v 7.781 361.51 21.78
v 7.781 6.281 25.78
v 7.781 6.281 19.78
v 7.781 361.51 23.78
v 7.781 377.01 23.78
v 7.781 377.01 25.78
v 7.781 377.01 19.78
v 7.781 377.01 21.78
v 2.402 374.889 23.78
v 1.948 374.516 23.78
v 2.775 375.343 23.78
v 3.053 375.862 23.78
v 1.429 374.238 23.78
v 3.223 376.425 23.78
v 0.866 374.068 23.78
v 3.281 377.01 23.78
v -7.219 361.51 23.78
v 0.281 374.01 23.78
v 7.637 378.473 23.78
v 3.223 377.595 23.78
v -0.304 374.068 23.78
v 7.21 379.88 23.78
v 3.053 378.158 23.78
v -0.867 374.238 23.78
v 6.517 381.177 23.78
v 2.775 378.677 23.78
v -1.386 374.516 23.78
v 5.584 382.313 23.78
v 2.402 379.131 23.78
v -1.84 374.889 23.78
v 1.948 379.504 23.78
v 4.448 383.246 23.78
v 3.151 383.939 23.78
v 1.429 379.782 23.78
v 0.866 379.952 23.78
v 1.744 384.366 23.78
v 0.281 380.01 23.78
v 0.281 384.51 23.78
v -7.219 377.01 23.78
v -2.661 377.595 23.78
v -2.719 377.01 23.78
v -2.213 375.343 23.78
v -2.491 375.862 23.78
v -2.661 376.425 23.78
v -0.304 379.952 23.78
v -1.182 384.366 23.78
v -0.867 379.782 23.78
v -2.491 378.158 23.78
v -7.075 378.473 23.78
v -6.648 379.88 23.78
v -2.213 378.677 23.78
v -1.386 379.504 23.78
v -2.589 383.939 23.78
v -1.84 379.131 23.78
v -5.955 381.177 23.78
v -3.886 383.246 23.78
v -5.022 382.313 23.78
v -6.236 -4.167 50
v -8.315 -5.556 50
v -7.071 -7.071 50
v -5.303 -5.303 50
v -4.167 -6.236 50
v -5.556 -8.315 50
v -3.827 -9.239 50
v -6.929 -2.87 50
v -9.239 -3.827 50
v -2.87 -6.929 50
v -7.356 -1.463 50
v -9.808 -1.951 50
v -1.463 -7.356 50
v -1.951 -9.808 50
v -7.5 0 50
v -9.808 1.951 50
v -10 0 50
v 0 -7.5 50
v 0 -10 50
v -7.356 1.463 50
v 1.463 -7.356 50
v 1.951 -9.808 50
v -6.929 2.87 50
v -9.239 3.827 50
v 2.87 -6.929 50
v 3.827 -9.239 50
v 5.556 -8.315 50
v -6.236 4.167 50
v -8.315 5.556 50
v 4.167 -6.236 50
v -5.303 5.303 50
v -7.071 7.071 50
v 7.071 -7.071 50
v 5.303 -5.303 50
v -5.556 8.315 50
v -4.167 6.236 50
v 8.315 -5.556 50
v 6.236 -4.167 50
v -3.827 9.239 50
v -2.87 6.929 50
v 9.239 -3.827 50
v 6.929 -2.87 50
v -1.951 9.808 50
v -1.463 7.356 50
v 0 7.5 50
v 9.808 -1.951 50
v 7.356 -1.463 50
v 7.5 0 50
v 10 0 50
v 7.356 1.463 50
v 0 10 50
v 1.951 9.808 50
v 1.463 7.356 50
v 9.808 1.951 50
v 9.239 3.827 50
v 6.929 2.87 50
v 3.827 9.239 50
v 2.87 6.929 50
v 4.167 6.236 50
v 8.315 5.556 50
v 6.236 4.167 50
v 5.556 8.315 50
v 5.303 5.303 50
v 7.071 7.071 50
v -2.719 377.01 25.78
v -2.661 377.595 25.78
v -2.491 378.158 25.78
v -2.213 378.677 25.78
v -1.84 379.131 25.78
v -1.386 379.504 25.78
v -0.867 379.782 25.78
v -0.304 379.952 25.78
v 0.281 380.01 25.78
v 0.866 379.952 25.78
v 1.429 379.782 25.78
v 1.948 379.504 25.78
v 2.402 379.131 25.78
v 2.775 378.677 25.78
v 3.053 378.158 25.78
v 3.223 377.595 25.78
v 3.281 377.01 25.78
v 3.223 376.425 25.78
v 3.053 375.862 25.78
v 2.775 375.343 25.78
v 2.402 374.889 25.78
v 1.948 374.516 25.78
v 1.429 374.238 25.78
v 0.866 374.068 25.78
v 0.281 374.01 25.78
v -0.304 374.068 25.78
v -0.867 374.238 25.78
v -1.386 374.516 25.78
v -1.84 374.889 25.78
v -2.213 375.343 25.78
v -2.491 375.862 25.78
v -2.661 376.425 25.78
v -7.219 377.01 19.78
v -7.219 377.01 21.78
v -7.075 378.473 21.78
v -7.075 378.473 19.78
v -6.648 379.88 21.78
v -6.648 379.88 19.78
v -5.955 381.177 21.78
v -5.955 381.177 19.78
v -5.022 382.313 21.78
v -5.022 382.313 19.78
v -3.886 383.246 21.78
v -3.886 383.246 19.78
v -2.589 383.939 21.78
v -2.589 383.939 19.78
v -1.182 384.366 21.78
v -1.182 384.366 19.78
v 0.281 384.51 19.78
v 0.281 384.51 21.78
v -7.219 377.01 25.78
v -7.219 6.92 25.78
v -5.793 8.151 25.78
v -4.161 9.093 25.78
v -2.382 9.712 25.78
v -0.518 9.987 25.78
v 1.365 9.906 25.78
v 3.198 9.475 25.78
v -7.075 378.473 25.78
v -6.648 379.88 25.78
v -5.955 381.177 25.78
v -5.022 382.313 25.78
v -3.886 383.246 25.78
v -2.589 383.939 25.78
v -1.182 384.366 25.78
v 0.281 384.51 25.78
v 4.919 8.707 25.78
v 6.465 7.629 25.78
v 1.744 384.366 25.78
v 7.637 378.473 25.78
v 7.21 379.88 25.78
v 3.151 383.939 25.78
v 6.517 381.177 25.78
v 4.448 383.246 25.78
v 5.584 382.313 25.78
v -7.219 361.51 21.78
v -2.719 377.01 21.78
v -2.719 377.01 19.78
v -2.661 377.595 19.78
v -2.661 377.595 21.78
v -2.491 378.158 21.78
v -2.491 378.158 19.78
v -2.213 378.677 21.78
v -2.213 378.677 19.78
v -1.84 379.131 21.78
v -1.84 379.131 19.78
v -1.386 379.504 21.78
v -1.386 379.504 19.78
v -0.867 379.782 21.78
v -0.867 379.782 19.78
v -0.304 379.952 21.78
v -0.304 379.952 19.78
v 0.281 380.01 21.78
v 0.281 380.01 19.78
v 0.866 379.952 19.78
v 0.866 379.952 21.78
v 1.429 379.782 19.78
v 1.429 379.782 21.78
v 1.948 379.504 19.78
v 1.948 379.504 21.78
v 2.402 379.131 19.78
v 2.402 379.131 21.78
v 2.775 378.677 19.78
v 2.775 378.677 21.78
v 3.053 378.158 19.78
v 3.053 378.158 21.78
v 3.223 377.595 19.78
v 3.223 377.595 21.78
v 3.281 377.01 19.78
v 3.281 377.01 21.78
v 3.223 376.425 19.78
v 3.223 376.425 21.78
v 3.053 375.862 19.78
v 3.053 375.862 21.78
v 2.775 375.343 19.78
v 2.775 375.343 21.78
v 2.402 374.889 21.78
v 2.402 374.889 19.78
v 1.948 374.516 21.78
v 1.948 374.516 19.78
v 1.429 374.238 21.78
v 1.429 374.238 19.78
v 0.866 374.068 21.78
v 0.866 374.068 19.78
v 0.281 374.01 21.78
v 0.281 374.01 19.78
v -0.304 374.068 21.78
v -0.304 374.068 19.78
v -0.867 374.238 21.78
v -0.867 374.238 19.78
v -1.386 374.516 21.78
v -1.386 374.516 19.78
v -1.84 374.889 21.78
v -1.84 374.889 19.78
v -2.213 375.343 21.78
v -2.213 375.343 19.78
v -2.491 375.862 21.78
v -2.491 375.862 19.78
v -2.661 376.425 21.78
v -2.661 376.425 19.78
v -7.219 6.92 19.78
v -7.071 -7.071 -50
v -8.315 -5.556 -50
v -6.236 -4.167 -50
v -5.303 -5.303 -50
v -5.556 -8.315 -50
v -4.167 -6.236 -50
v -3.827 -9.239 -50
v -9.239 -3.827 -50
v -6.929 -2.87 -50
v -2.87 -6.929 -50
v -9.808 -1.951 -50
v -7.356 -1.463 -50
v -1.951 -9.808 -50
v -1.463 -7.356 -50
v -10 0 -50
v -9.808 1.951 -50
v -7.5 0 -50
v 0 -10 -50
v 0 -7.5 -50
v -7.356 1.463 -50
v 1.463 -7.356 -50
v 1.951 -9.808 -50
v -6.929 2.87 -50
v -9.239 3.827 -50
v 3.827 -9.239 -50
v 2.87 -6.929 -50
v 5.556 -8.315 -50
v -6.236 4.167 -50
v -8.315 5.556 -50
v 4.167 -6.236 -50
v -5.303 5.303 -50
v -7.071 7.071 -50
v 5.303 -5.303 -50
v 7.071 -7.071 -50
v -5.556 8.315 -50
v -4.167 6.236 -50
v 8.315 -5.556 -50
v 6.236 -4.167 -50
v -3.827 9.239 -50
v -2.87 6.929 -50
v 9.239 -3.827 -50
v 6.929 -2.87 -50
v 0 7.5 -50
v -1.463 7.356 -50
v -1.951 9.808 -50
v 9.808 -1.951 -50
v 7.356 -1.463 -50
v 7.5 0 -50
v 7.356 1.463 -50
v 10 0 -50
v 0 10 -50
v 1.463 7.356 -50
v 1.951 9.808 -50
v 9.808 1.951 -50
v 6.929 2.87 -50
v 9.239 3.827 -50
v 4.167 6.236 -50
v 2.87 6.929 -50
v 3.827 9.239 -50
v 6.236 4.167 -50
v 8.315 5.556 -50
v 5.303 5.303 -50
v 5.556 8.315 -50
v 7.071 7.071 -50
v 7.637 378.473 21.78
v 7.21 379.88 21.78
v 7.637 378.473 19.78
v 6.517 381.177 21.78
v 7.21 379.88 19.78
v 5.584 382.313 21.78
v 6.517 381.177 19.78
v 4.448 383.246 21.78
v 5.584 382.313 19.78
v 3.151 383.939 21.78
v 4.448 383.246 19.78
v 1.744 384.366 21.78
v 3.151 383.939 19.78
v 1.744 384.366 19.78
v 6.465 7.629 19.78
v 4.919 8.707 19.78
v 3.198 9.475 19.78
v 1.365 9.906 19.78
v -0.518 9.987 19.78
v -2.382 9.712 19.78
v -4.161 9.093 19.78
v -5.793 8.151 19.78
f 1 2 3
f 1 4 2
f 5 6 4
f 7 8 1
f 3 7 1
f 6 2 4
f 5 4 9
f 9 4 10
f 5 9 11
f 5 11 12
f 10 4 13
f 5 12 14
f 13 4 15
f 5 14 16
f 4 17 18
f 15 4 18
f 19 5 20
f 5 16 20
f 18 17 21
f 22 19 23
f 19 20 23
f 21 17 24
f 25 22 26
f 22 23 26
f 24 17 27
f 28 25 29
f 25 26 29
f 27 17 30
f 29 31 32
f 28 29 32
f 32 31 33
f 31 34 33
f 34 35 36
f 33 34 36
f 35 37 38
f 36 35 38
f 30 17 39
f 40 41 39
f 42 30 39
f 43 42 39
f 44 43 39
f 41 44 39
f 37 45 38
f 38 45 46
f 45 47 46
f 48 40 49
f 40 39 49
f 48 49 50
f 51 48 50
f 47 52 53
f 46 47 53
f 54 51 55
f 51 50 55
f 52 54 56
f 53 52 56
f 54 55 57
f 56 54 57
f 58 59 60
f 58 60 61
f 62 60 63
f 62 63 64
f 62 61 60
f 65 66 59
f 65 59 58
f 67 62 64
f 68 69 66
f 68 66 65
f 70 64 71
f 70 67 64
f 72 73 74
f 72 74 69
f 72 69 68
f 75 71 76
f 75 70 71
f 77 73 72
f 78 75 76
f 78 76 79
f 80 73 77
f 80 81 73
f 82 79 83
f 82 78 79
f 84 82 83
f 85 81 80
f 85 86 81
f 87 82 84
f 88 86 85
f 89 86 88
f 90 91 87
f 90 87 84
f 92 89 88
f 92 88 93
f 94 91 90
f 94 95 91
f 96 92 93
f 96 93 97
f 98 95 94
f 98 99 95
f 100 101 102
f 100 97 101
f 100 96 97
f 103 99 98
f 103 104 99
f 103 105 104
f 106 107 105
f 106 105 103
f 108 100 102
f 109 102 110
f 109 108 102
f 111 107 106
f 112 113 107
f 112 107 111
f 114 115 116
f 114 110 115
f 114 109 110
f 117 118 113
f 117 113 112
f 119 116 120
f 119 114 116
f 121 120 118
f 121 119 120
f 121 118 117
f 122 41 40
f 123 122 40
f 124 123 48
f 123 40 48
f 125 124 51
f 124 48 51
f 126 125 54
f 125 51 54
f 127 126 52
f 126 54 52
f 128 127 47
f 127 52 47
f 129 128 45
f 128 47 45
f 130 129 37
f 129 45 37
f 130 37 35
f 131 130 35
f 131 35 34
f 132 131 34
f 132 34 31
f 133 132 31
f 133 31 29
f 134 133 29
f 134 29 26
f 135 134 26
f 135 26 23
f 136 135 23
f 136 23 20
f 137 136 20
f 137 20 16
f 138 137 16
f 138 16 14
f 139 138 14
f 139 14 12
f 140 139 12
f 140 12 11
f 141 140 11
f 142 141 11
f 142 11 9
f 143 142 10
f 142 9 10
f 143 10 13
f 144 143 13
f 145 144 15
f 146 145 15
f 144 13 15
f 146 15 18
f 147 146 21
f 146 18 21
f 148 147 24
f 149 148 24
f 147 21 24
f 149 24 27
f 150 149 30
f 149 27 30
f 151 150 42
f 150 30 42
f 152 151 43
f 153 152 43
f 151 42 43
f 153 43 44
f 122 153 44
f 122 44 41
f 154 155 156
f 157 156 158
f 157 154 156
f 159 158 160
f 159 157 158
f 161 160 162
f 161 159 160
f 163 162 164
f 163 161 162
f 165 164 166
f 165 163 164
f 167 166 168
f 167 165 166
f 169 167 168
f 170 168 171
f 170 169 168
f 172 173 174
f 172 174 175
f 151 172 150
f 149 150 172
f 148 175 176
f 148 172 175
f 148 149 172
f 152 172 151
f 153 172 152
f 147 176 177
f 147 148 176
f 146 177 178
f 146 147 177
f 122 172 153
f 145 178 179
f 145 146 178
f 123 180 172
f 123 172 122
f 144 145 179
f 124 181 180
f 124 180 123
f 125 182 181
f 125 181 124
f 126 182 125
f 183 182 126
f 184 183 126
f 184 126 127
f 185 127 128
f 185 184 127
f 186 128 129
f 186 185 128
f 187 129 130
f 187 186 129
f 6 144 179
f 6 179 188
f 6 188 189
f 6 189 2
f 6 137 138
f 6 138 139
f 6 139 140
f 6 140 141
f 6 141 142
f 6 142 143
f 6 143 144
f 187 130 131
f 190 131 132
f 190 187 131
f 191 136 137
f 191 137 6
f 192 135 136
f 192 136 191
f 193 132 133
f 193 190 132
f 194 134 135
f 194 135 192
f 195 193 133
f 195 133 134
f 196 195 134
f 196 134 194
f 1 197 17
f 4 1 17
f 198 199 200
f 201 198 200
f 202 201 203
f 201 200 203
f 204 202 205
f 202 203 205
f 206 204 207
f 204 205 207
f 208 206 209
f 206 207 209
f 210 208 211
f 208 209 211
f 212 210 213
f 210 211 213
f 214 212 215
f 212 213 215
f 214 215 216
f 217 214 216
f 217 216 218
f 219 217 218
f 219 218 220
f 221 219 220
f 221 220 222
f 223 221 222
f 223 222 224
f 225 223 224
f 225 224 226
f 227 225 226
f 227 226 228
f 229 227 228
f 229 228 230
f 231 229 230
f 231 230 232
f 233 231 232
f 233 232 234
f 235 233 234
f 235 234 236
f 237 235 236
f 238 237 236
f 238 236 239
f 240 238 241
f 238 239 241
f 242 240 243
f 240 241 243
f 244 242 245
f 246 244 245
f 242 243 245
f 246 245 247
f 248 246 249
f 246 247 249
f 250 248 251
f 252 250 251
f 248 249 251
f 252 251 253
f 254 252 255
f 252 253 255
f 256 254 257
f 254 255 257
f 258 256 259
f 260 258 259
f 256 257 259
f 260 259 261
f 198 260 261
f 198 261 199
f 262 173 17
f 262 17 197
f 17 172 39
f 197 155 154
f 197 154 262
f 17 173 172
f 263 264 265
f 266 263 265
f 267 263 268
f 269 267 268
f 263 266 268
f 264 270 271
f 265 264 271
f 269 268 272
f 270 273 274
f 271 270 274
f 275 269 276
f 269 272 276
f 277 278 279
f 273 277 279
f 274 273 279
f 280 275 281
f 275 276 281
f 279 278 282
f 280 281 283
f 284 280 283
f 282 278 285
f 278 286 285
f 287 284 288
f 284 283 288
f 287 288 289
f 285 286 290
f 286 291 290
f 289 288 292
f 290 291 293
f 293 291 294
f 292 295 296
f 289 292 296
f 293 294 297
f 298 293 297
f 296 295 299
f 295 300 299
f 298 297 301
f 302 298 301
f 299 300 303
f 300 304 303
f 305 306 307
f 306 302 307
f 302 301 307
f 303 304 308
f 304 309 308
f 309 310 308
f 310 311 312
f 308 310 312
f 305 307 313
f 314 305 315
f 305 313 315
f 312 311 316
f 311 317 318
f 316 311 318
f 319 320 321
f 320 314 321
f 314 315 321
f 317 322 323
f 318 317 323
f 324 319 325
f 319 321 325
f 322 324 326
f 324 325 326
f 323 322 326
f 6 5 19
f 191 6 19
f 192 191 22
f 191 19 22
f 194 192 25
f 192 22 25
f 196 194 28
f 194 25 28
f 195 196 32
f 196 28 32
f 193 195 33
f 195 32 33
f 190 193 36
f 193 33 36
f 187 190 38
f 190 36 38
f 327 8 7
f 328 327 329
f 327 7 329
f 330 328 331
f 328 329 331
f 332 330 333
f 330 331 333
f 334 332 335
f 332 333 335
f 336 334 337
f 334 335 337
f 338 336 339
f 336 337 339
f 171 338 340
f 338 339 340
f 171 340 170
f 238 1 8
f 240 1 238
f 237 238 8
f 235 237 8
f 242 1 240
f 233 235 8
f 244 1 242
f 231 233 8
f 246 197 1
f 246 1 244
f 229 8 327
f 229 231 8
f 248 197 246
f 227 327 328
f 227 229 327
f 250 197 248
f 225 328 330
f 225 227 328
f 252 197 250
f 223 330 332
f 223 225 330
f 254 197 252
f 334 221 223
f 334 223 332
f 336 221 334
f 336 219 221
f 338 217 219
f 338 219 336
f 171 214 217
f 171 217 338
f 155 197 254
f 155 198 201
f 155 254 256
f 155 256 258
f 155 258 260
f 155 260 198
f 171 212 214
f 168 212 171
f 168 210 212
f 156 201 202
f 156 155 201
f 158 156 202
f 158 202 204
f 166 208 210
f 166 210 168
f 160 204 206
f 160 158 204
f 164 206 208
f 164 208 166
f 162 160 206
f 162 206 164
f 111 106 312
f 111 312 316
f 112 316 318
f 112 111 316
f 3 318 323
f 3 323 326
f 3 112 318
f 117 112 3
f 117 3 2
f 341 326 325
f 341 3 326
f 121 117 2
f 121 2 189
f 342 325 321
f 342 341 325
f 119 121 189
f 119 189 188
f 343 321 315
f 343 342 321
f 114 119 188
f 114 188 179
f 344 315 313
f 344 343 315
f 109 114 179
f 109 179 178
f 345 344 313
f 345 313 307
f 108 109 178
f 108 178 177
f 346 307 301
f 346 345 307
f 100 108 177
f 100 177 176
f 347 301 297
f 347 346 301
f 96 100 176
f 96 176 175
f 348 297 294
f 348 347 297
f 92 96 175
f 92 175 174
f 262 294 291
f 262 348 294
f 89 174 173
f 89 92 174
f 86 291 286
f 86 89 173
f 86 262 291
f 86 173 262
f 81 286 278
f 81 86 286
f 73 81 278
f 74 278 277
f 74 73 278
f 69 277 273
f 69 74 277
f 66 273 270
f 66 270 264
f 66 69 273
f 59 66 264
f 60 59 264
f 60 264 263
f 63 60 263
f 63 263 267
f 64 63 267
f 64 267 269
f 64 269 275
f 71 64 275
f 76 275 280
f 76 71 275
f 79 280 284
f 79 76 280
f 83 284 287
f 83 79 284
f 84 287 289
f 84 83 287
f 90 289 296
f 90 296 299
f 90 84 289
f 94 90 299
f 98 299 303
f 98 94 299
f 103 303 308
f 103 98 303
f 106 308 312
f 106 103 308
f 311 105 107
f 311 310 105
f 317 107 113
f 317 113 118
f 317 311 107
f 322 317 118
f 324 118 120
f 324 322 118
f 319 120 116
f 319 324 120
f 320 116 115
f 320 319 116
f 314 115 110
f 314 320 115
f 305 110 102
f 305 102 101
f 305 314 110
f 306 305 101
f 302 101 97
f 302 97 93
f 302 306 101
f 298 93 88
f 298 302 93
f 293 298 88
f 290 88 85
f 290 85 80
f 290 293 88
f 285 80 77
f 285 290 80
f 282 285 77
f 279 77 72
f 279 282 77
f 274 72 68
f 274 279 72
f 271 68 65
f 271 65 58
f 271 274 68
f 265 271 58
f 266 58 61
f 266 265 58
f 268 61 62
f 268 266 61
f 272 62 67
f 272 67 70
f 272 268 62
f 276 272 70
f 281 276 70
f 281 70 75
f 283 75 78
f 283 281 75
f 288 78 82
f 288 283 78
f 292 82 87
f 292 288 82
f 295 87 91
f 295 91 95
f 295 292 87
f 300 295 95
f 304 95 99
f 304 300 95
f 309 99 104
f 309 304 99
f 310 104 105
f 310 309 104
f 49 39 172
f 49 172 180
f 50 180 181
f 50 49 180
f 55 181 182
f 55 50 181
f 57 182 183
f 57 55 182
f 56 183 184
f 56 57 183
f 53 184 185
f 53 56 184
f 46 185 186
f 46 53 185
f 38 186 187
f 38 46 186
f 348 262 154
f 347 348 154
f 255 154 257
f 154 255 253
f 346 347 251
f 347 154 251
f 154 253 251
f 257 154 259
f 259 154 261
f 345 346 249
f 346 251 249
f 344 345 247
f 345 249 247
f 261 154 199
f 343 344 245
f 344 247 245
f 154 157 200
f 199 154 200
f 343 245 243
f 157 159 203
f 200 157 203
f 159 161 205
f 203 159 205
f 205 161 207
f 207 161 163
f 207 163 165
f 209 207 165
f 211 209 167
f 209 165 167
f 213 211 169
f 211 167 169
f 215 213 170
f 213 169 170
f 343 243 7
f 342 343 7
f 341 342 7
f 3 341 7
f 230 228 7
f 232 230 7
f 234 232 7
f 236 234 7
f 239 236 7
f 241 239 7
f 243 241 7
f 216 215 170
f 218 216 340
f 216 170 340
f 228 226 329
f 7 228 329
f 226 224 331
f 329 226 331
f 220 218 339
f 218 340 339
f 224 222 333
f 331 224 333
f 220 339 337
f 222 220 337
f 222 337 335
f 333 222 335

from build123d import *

# Parameters (mm, degrees)
SKETCH_1_R           = 10
SKETCH_1_R_2         = 7.5
EXTRUDE_1_DEPTH      = 50
EXTRUDE_2_REACH      = 399.792
EXTRUDE_2_END_RADIUS = 10
SKETCH_2_W           = 15
SKETCH_2_H           = 6
FILLET_1_R           = 7.5
SKETCH_3_R           = 3
CUT_EXTRUDE_1_DEPTH  = 10
SKETCH_4_W           = 2
SKETCH_4_H           = 23
CUT_EXTRUDE_2_DEPTH  = 20


with BuildPart() as part:
    # 草图1 → 凸台-拉伸1 (new, symmetric)
    with BuildSketch(Plane.XY):
        Circle(SKETCH_1_R)
        Circle(SKETCH_1_R_2, mode=Mode.SUBTRACT)
    extrude(amount=EXTRUDE_1_DEPTH, both=True)

    # 凸台-拉伸2: up to this cylinder (the profile starts outside it)
    extrude_2_end = Plane(origin=(0, 0, 22.779793), z_dir=(0, 0, -1)) * Cylinder(EXTRUDE_2_END_RADIUS, 820.584, mode=Mode.PRIVATE)
    # 草图2 → 凸台-拉伸2 (add, up to the surface)
    with BuildSketch(Plane(origin=(0, 384.51, 0), x_dir=(1, 0, 0), z_dir=(0, 1, 0)), mode=Mode.PRIVATE) as extrude_2_sk1:
        with Locations((0.280971345, -22.779792891)):
            Rectangle(SKETCH_2_W, SKETCH_2_H)
    extrude_2_tool1 = extrude(extrude_2_sk1.sketch, amount=-EXTRUDE_2_REACH, mode=Mode.PRIVATE) - extrude_2_end
    add(extrude_2_tool1.solids().sort_by_distance((0.280971, 384.51, 22.779793))[0])

    # 圆角1
    fillet_1_edges = [part.edges().sort_by_distance(p)[0] for p in [
        (7.780971345, 384.51, 22.779792891),
        (-7.219028655, 384.51, 22.779792891),
    ]]
    fillet(fillet_1_edges, radius=FILLET_1_R - 0.0001)  # a hair under: the kernel refuses the full size

    # 草图3 → 切除-拉伸1 (cut)
    with BuildSketch(Plane(origin=(0, 0, 19.779792891), x_dir=(-1, 0, 0), z_dir=(0, 0, -1))):
        with Locations((-0.280971345, 377.01)):
            Circle(SKETCH_3_R)
    extrude(amount=-CUT_EXTRUDE_1_DEPTH, mode=Mode.SUBTRACT)

    # 草图4 → 切除-拉伸2 (cut)
    with BuildSketch(Plane.ZY.offset(7.219028655)):
        with Locations((22.779792891, 373.01)):
            Rectangle(SKETCH_4_W, SKETCH_4_H)
    extrude(amount=-CUT_EXTRUDE_2_DEPTH, mode=Mode.SUBTRACT)


solid = part.part
